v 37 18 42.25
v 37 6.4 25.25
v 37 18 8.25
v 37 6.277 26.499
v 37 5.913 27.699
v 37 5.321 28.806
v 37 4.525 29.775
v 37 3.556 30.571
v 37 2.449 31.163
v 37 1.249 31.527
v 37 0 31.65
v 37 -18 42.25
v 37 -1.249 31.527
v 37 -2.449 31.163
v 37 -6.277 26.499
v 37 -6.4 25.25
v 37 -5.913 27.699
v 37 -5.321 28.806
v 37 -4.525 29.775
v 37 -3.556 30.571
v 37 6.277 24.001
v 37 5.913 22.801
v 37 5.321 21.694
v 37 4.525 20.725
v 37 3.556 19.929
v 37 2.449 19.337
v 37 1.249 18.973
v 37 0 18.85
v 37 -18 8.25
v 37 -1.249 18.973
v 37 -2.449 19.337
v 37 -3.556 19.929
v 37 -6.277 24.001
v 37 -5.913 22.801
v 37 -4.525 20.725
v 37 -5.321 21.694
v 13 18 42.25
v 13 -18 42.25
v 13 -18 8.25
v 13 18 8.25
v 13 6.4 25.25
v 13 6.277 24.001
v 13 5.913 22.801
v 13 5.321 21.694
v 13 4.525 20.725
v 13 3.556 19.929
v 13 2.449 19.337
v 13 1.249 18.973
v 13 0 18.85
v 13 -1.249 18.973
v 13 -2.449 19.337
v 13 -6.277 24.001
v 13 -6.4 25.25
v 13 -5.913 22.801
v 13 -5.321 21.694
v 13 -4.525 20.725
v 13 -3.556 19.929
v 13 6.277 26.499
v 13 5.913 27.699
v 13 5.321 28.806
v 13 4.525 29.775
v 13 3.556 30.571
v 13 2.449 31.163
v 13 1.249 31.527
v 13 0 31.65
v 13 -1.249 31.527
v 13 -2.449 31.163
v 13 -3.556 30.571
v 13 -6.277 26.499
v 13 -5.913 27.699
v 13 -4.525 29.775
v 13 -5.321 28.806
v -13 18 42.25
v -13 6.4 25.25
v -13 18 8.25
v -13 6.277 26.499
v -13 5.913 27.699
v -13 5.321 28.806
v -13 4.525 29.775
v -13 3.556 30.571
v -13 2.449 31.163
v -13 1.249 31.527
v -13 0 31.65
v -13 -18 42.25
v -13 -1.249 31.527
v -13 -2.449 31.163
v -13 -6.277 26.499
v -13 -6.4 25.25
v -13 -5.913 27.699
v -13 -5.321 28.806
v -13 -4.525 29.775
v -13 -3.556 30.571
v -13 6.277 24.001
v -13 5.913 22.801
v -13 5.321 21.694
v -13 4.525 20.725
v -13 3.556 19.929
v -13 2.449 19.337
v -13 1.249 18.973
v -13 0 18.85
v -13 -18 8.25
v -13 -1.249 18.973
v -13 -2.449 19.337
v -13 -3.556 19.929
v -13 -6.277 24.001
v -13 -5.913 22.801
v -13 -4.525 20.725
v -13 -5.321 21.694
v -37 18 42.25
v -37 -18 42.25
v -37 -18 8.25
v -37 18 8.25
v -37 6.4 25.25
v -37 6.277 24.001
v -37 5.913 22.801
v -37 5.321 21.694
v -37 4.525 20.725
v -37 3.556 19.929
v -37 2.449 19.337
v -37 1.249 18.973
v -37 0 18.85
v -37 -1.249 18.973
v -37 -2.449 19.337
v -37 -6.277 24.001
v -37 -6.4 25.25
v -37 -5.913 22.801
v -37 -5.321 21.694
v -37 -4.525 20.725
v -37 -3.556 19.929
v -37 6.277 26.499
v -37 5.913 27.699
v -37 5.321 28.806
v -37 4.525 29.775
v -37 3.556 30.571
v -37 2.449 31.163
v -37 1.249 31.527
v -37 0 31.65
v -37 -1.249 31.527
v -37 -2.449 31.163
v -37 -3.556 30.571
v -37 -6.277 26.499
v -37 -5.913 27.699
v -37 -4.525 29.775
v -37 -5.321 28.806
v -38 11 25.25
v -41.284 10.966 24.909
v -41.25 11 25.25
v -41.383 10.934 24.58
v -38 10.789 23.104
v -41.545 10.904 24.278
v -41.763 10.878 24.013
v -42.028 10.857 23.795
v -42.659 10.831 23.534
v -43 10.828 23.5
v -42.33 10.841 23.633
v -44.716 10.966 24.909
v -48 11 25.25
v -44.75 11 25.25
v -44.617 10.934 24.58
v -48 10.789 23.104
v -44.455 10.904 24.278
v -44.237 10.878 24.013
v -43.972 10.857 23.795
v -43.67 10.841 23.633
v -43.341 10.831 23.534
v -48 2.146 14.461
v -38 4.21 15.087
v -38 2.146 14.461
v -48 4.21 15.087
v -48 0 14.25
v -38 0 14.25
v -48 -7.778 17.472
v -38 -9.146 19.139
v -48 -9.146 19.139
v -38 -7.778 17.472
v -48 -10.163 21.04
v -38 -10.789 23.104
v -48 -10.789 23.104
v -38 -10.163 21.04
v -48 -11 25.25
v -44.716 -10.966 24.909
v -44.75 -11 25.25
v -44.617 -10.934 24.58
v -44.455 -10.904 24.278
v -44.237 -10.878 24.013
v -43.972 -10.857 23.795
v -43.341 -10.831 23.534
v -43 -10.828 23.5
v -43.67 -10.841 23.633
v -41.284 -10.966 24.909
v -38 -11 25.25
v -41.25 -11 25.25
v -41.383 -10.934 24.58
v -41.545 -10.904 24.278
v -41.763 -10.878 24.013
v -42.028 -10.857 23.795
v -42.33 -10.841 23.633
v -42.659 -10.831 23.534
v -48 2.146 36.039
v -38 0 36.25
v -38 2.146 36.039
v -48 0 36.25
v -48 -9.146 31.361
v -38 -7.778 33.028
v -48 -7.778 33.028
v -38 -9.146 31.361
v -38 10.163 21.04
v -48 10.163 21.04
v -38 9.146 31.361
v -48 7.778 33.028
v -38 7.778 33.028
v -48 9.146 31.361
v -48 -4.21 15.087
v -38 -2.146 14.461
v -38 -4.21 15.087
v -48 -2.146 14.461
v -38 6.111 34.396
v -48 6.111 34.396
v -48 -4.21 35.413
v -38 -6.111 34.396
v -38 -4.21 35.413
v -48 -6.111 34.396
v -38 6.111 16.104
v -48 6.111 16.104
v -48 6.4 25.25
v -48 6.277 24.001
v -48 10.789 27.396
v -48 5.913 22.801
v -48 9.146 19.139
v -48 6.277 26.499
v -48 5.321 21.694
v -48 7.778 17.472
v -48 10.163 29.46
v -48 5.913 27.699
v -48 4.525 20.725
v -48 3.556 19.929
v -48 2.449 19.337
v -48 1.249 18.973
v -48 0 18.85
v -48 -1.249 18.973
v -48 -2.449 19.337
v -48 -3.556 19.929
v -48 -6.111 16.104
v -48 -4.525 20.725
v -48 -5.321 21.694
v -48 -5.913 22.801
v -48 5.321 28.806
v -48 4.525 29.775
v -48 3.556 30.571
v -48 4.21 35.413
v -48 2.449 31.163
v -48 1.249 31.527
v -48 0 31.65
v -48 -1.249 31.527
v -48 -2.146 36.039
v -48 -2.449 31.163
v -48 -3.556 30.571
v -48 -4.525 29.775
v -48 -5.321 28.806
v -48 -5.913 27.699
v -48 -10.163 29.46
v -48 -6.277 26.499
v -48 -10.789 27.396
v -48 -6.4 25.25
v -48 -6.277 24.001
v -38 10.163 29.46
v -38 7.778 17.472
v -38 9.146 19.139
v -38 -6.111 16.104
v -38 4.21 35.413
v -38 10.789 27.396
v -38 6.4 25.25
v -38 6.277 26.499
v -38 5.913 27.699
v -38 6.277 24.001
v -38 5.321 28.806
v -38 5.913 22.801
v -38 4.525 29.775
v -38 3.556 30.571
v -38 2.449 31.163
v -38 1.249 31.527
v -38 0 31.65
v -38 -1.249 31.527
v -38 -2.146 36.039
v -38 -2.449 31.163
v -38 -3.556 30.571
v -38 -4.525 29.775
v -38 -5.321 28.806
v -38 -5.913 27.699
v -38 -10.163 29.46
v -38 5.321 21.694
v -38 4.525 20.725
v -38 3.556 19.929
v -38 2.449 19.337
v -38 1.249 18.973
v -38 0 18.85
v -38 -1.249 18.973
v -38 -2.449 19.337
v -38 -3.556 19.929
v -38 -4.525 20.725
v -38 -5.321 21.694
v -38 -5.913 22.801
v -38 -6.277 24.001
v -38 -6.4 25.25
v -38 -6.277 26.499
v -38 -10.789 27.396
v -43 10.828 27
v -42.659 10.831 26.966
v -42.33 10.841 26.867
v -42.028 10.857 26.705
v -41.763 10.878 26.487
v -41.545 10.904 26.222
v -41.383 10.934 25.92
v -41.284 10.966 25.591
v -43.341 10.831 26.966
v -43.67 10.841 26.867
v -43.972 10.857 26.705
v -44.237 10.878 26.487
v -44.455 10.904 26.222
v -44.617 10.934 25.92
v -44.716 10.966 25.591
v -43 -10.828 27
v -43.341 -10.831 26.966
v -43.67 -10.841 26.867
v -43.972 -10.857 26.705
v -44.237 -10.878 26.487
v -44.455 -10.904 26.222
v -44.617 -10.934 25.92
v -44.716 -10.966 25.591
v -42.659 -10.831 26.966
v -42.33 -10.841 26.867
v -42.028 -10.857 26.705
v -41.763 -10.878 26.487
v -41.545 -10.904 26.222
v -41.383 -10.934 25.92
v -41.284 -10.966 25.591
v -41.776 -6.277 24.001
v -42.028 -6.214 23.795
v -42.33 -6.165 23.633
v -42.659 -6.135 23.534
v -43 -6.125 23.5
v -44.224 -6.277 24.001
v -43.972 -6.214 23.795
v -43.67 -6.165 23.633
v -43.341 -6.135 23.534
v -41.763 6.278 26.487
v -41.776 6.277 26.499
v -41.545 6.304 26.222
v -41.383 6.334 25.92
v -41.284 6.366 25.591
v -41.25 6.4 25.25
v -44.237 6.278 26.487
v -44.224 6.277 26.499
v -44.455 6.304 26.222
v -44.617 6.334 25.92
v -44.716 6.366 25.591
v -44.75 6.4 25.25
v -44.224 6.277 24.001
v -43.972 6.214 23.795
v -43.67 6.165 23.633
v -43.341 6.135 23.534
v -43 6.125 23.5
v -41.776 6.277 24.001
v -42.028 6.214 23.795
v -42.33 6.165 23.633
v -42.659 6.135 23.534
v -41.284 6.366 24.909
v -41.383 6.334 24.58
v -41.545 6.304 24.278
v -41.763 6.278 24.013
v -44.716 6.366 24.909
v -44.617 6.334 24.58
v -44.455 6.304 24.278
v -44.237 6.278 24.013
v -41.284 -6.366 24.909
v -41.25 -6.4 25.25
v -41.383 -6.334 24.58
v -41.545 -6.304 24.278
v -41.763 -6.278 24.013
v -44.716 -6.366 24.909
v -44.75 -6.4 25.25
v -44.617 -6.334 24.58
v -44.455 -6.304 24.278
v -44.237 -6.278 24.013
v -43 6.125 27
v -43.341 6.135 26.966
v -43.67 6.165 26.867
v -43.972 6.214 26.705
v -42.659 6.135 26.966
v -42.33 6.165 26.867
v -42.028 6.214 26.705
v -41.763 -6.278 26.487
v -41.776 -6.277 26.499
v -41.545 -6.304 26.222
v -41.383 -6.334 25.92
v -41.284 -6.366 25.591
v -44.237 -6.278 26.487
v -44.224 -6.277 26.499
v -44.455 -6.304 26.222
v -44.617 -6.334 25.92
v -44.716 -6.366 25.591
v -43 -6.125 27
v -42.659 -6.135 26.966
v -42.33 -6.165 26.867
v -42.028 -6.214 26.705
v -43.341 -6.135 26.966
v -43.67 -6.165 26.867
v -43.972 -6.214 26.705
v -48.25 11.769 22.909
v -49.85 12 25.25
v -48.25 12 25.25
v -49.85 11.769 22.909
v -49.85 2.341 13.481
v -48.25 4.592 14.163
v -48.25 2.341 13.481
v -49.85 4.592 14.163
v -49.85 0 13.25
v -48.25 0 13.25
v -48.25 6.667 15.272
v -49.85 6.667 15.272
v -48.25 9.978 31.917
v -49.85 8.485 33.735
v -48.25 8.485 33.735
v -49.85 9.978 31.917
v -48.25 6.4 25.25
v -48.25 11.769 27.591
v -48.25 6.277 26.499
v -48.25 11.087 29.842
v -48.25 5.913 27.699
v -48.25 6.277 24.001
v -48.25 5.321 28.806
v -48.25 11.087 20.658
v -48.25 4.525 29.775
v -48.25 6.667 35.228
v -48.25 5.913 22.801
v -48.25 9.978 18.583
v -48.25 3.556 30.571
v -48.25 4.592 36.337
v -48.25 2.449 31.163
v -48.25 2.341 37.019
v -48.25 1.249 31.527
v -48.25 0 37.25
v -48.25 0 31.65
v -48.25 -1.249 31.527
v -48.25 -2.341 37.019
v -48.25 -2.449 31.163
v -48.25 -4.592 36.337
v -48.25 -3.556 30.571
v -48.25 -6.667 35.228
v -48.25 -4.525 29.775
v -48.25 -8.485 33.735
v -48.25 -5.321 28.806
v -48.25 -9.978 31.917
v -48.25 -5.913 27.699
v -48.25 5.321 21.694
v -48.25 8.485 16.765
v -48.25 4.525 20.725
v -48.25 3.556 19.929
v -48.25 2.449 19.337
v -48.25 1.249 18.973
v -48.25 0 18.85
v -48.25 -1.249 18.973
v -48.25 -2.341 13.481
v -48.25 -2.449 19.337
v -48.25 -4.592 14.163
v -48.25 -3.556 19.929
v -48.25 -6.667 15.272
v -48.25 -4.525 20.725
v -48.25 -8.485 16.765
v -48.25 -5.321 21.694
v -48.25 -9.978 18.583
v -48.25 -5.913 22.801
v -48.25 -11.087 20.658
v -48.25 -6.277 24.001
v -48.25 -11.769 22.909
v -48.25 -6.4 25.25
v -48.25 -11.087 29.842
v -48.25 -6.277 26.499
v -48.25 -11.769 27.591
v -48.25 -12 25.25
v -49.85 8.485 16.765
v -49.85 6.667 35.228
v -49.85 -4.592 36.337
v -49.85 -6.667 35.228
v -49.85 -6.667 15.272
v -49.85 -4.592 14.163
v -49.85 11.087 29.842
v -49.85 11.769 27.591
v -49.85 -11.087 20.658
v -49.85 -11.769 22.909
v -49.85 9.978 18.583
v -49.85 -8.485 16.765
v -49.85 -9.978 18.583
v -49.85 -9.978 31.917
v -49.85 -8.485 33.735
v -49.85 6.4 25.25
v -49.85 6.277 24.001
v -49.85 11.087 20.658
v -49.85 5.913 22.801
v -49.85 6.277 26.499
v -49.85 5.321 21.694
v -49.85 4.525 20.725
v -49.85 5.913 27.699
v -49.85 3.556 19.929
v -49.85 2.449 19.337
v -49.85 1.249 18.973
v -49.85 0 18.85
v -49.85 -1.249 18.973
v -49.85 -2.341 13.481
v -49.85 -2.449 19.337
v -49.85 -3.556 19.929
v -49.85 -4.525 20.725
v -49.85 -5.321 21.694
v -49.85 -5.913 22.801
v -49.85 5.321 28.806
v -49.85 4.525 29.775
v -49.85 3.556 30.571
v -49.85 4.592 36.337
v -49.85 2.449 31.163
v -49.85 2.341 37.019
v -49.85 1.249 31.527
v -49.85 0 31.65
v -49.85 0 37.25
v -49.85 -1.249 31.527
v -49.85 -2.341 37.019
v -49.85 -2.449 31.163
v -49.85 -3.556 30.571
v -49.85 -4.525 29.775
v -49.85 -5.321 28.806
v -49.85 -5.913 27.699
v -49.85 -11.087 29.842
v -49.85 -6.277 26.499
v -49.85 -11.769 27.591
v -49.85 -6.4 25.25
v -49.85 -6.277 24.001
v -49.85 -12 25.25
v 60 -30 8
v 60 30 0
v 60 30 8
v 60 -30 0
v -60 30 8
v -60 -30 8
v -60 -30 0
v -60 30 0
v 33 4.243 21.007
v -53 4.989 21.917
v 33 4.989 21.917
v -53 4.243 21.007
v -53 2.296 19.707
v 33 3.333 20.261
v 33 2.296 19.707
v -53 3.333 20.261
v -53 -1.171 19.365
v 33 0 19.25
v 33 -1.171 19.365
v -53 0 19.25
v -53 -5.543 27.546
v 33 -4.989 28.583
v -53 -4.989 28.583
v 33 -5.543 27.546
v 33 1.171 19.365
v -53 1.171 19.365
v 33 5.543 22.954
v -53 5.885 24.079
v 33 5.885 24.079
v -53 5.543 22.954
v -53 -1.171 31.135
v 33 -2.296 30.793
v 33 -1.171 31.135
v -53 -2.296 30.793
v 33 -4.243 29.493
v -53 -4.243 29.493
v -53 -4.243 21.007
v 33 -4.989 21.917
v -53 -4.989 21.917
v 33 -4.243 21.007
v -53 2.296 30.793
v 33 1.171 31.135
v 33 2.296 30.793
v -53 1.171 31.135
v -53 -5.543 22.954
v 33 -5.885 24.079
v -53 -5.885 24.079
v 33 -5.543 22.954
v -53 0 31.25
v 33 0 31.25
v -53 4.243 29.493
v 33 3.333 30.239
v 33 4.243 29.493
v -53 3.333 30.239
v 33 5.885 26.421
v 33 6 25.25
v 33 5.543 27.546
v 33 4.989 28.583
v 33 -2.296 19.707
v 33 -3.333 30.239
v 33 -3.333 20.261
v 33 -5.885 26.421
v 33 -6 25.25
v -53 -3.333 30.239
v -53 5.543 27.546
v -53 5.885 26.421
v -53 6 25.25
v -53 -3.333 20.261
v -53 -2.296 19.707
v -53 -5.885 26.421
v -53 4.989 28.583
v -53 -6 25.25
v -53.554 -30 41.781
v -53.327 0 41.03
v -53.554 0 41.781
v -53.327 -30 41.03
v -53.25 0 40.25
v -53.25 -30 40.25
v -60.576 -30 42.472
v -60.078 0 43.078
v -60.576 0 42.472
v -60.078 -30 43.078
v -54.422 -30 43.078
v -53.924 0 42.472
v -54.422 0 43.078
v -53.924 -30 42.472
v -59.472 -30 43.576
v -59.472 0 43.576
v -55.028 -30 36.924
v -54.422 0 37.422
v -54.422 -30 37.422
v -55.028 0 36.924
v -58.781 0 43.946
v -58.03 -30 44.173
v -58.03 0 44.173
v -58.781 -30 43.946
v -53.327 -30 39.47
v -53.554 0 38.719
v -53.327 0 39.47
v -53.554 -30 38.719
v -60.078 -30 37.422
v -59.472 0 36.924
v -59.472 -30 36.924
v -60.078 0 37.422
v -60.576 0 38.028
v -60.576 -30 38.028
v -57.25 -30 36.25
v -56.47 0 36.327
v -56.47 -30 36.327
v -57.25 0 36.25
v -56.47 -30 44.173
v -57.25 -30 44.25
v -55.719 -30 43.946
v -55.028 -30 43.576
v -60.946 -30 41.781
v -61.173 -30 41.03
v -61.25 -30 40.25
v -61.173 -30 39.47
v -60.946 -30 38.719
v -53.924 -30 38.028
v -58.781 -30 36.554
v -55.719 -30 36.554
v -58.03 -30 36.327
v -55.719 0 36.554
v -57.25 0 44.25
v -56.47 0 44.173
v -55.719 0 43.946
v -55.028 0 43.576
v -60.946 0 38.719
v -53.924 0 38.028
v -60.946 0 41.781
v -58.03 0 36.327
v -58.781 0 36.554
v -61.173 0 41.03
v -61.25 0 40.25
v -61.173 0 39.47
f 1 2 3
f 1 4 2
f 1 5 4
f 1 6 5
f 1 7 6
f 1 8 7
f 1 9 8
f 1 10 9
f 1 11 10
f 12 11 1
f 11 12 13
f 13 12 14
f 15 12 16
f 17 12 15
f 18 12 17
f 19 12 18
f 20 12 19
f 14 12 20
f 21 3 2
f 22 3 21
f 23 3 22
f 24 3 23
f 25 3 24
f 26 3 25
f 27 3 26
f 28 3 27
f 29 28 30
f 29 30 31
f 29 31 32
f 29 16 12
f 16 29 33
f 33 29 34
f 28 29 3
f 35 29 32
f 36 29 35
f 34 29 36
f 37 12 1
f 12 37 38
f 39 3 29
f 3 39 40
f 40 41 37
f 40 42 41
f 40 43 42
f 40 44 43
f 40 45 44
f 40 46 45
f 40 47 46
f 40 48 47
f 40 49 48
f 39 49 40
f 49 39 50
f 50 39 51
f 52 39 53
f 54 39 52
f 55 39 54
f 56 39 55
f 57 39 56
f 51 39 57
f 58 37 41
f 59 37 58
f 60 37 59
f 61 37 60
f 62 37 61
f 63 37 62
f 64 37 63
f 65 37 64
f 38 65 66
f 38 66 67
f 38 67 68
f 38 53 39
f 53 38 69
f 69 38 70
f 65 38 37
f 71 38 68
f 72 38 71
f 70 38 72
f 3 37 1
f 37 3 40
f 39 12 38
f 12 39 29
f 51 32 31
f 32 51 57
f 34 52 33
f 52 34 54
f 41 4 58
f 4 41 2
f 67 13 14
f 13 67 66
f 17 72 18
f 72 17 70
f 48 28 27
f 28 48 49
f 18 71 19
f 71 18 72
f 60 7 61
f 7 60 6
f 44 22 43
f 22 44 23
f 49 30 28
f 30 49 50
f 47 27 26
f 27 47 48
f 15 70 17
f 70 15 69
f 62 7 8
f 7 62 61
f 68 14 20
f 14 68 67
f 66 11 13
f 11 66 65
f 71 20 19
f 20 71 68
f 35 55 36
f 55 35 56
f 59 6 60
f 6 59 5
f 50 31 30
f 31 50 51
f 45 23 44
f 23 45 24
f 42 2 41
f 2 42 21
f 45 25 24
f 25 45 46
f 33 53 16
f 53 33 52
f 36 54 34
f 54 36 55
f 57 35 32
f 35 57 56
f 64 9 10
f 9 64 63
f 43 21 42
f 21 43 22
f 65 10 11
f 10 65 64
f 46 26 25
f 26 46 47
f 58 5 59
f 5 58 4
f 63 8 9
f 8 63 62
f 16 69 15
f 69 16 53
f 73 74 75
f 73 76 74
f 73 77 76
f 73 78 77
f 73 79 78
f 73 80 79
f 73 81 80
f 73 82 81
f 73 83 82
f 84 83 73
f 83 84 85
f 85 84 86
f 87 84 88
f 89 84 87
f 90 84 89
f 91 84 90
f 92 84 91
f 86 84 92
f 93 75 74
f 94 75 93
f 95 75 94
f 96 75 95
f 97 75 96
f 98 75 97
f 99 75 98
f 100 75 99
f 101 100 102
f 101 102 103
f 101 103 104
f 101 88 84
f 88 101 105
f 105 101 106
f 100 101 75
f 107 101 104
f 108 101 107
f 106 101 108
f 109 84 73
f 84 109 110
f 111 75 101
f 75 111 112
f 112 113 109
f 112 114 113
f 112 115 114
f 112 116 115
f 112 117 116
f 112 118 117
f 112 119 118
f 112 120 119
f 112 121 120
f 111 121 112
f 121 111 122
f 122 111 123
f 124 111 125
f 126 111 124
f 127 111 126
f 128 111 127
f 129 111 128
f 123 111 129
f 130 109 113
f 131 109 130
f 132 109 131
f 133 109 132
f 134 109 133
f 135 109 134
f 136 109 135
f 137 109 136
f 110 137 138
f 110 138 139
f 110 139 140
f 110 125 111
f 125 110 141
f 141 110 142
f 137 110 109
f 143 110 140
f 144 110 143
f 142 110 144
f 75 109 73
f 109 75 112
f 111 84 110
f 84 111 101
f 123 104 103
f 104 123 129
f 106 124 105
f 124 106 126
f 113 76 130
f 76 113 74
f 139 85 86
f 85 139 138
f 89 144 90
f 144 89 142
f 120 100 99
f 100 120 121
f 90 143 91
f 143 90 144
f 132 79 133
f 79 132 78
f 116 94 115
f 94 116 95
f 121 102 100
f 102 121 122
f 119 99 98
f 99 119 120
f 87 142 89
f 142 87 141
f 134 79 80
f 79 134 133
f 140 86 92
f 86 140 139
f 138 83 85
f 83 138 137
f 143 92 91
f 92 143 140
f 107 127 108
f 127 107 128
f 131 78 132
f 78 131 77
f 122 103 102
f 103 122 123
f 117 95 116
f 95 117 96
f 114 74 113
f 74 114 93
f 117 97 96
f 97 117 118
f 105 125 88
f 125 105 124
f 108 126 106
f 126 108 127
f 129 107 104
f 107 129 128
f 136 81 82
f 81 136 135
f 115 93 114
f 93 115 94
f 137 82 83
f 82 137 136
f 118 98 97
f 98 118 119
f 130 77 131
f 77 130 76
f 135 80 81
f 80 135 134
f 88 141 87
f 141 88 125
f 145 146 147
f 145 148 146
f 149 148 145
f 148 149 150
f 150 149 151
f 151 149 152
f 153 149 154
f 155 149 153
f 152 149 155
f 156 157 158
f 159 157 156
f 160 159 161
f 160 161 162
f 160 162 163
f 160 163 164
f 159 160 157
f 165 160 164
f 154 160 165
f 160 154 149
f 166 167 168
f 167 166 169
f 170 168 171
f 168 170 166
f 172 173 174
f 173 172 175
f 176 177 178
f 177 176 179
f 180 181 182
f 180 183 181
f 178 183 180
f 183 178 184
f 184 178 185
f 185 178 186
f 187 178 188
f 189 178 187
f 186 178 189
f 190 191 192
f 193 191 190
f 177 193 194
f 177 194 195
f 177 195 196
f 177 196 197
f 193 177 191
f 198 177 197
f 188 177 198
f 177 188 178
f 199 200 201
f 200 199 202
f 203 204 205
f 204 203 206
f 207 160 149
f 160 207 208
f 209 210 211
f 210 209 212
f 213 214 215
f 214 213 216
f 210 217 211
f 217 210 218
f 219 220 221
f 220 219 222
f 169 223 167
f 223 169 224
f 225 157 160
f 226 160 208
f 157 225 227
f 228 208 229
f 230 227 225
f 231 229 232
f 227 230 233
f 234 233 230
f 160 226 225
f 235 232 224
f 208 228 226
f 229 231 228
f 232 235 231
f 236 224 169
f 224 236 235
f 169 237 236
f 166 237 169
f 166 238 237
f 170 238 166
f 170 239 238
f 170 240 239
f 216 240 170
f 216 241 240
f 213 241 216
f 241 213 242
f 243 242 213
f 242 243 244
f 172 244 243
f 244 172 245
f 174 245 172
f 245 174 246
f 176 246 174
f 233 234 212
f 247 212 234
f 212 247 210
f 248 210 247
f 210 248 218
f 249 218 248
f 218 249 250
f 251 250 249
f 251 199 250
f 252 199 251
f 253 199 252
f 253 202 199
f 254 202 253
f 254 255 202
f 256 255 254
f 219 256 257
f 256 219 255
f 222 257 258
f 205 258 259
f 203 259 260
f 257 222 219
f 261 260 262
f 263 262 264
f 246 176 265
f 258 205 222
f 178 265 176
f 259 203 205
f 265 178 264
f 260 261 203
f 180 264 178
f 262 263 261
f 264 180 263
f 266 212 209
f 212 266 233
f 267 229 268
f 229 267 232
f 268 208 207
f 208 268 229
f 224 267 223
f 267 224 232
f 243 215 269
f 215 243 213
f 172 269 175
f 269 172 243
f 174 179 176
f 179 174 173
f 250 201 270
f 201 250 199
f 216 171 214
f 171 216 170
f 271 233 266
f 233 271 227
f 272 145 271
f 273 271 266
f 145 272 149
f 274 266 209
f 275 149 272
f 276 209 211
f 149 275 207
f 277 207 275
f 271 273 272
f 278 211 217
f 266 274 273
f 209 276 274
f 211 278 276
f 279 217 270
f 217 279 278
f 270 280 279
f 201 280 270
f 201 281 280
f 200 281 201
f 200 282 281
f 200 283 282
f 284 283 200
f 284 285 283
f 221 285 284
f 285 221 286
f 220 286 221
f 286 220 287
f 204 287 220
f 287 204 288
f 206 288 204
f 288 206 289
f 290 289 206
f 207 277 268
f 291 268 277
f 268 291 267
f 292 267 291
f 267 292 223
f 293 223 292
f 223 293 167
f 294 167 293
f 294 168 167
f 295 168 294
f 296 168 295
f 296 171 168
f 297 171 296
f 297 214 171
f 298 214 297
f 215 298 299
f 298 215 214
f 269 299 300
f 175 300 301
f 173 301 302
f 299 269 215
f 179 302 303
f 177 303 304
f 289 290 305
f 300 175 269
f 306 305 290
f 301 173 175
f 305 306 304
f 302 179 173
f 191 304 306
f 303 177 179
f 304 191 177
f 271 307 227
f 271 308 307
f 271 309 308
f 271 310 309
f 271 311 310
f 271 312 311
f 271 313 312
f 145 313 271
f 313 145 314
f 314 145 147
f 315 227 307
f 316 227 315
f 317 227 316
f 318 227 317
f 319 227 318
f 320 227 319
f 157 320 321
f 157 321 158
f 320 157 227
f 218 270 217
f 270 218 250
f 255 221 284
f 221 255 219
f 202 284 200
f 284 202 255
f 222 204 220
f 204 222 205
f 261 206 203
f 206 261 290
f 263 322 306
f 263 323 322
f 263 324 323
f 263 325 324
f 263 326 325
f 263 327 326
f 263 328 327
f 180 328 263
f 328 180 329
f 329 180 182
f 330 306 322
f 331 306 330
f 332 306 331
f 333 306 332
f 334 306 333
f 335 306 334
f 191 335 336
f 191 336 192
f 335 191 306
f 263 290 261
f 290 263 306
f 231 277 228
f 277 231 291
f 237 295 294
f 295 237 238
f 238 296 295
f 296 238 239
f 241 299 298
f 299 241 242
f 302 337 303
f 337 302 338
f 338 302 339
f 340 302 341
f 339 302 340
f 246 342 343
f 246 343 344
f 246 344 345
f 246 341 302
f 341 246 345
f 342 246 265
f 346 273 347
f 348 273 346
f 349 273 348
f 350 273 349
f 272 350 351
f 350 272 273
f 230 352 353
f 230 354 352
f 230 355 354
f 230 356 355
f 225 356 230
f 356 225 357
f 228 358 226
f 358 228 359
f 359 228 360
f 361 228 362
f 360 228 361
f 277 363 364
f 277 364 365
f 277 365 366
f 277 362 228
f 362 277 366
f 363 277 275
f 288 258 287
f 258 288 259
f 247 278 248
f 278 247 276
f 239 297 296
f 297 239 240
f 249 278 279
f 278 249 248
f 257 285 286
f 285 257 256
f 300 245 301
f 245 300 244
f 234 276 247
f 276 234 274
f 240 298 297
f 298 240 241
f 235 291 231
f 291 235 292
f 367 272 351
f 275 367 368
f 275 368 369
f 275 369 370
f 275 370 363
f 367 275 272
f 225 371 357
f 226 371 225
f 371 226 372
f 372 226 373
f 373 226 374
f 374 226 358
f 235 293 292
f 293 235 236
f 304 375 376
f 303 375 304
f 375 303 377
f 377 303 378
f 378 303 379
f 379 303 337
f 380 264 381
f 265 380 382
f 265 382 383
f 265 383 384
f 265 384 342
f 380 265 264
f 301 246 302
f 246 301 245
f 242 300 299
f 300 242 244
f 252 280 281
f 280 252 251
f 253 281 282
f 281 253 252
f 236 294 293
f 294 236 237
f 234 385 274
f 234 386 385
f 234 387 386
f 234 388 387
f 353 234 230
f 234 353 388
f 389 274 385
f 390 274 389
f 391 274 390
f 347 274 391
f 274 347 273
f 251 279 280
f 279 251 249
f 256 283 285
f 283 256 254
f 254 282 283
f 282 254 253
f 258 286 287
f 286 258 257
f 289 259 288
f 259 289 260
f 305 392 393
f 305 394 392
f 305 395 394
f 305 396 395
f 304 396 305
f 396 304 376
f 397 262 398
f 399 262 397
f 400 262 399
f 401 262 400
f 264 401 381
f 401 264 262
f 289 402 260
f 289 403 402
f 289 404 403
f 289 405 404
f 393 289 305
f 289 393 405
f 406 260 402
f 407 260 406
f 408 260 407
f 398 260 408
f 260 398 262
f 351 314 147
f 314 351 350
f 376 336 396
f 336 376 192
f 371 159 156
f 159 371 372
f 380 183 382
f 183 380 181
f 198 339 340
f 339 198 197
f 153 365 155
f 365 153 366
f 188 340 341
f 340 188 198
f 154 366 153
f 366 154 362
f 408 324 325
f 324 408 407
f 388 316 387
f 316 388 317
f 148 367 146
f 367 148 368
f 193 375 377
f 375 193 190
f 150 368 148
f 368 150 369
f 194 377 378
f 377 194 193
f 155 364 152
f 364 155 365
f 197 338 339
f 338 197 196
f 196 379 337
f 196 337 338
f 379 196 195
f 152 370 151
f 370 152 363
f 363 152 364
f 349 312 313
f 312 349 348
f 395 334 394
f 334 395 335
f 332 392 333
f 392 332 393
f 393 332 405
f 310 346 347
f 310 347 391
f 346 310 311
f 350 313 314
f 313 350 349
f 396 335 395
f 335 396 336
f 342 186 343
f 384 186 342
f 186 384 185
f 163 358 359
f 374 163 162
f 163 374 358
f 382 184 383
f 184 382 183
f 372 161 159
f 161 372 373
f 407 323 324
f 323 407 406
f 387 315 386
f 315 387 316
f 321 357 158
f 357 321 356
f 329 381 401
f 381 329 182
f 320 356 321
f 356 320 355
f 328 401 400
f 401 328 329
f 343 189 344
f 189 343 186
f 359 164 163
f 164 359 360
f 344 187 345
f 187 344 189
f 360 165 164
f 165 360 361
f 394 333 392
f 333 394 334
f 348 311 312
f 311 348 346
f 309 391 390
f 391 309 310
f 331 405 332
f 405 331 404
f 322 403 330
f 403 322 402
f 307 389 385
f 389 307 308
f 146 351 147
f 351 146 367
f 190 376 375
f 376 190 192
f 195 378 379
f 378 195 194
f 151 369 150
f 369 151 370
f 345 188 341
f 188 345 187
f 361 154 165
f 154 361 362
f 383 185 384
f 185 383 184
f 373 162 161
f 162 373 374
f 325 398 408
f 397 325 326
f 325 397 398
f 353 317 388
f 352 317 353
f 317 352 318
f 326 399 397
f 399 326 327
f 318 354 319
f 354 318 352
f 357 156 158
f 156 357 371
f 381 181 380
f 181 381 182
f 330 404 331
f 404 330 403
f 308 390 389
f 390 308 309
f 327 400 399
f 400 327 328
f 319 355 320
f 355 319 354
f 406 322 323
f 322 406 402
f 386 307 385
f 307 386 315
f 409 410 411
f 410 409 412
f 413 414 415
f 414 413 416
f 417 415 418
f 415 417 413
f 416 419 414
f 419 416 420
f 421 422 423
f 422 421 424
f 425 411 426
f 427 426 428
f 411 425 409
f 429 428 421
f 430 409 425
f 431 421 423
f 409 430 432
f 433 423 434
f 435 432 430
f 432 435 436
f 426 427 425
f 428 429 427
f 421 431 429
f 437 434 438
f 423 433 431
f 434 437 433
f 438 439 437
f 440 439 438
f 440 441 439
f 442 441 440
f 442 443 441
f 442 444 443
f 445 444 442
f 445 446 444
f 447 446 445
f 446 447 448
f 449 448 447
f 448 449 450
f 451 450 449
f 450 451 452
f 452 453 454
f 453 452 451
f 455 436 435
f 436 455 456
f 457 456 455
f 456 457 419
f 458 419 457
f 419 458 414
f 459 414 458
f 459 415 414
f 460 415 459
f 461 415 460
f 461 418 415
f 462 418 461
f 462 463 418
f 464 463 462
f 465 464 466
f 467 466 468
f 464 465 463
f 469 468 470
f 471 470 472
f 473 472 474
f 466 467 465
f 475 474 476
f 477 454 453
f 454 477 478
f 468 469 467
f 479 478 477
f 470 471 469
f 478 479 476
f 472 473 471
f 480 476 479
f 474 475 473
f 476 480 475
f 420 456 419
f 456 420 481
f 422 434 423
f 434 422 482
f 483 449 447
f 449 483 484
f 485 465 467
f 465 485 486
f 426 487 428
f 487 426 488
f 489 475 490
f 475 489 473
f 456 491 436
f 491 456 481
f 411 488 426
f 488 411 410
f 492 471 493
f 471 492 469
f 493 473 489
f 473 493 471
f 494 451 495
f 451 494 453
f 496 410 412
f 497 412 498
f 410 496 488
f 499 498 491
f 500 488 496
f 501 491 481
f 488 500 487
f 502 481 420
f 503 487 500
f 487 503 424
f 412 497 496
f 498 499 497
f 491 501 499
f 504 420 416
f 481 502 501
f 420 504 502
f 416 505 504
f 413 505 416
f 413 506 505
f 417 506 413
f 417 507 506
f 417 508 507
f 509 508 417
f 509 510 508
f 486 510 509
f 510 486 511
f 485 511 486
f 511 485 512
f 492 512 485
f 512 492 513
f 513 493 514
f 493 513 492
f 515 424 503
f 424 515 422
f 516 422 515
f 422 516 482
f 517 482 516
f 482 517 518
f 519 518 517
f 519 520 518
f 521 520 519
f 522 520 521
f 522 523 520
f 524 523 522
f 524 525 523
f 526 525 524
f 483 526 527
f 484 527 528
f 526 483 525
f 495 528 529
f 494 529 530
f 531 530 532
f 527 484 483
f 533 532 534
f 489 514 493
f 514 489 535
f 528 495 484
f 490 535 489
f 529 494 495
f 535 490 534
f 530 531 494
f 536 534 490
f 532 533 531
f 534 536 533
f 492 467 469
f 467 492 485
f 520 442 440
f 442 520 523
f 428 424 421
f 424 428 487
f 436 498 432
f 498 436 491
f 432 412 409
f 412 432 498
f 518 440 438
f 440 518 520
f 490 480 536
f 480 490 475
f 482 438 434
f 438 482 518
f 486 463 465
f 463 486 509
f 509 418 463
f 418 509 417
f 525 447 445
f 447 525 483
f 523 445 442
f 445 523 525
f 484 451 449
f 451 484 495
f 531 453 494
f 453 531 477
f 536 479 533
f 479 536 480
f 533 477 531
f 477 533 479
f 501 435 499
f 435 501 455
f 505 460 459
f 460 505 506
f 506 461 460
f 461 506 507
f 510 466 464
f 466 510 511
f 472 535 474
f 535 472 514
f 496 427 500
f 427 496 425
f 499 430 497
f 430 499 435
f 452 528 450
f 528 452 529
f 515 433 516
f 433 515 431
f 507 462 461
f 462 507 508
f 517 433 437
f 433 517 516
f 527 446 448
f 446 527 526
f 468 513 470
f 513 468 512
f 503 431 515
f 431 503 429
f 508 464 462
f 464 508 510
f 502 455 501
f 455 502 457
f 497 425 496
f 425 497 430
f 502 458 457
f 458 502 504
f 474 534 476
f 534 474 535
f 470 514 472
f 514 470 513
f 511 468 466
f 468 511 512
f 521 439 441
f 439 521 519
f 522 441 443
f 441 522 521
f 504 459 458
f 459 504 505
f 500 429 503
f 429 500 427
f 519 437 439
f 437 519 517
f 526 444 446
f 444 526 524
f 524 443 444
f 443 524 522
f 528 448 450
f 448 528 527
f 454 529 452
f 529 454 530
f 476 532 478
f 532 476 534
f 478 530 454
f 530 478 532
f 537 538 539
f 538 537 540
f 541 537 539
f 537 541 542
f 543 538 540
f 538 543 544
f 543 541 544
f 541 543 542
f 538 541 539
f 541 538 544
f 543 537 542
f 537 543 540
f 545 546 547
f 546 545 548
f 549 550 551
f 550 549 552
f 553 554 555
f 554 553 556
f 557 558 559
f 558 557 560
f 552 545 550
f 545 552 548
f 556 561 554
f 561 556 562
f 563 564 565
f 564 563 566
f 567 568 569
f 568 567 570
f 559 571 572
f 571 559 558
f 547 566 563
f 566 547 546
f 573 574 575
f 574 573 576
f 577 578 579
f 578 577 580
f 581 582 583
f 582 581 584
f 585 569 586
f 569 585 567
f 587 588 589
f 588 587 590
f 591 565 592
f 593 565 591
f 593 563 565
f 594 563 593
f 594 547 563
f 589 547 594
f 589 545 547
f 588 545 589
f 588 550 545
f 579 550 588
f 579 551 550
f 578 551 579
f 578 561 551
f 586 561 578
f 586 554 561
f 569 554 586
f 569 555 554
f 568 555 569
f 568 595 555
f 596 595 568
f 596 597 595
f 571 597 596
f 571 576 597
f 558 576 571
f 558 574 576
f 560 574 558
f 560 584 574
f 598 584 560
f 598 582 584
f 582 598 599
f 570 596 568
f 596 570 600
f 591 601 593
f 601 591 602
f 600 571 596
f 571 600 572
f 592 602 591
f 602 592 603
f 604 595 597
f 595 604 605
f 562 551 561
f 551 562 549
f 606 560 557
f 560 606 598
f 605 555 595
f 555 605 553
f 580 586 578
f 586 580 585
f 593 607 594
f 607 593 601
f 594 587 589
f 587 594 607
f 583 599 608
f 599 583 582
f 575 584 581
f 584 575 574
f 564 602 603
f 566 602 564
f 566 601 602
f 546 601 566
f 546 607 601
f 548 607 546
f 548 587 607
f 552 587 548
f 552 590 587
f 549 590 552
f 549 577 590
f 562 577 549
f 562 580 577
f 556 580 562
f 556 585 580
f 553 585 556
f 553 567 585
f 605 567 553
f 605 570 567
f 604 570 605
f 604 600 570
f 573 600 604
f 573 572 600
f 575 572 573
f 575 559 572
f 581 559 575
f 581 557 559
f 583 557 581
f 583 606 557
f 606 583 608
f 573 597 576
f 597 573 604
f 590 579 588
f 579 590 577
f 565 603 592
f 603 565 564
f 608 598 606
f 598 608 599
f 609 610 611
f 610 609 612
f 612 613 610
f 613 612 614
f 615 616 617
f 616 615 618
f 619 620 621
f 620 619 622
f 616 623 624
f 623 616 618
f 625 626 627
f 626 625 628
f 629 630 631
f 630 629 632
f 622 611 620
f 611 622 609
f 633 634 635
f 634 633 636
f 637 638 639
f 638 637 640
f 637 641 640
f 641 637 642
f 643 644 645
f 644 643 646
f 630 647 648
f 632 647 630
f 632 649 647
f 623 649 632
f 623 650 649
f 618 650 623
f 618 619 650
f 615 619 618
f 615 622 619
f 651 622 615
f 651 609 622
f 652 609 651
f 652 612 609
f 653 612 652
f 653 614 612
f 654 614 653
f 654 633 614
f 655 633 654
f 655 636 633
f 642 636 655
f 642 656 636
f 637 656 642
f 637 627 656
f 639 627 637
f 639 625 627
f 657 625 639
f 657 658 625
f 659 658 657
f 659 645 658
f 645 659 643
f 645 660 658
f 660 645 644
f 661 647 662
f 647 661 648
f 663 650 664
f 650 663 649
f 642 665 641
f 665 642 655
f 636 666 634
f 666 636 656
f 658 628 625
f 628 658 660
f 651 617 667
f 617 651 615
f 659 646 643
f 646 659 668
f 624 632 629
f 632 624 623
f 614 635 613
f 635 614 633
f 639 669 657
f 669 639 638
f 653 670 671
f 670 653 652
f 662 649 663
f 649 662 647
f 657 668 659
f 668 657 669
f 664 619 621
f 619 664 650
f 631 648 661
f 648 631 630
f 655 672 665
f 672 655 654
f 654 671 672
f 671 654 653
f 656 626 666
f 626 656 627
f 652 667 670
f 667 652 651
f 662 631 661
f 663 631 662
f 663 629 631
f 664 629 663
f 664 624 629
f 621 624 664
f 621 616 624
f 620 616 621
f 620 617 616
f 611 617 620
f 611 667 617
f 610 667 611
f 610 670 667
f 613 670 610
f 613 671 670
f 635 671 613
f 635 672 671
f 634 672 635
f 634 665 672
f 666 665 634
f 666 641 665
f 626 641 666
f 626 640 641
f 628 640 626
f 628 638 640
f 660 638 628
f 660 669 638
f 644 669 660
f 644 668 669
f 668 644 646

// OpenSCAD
$fn = 32;

// ------------------------------------------------------------------------
// Machine vise: screw d12, jaws 24 x 34 mm
// Every part is its own module, assembly() places every instance.
// ------------------------------------------------------------------------

// --- part 1 ---
module vise_bed() {
  difference() {
    translate([-60, -30, 0]) cube([120, 60, 8]);
  }
}

// --- part 2 ---
module vise_jaw() {
  difference() {
    translate([-12, -18, 0]) cube([24, 36, 34]);
    translate([0, 0, 17]) rotate([0, 90, 0]) cylinder(h = 26, d = 12.8, center = true);
  }
}

// --- part 3 ---
module vise_screw() {
  translate([0, 0, -43]) cylinder(h = 86, d = 12);
}

// --- part 4 ---
module screw_collar() {
  difference() {
    cylinder(h = 10, d = 22);
    translate([0, 0, -1]) cylinder(h = 12, d = 12.8);
    translate([0, 0, 5]) rotate([90, 0, 0]) cylinder(h = 24, d = 3.5, center = true);
  }
}

// --- part 5 ---
module screw_washer() {
  difference() {
      translate([0, 0, 0]) cylinder(h = 1.6, d = 24);
      translate([0, 0, -1]) cylinder(h = 3.6, d = 12.8);
    }
}

// --- part 6 ---
module vise_handle() {
  cylinder(h = 30, d = 8);
}

// --- assembly ---
module assembly() {
  color([0.80, 0.24, 0.20]) translate([0, 0, 0]) rotate([0, 0, 0]) vise_bed();
  color([0.20, 0.45, 0.75]) translate([25, 0, 8.25]) rotate([0, 0, 0]) vise_jaw();
  color([0.25, 0.62, 0.32]) translate([-25, 0, 8.25]) rotate([0, 0, 0]) vise_jaw();
  color([0.92, 0.70, 0.18]) translate([-10, 0, 25.25]) rotate([0, 90, 0]) vise_screw();
  color([0.58, 0.35, 0.70]) translate([-48, 0, 25.25]) rotate([0, 90, 0]) screw_collar();
  color([0.16, 0.66, 0.66]) translate([-49.85, 0, 25.25]) rotate([0, 90, 0]) screw_washer();
  color([0.85, 0.48, 0.18]) translate([-57.25, 0, 40.25]) rotate([90, 0, 0]) vise_handle();
}

assembly();
